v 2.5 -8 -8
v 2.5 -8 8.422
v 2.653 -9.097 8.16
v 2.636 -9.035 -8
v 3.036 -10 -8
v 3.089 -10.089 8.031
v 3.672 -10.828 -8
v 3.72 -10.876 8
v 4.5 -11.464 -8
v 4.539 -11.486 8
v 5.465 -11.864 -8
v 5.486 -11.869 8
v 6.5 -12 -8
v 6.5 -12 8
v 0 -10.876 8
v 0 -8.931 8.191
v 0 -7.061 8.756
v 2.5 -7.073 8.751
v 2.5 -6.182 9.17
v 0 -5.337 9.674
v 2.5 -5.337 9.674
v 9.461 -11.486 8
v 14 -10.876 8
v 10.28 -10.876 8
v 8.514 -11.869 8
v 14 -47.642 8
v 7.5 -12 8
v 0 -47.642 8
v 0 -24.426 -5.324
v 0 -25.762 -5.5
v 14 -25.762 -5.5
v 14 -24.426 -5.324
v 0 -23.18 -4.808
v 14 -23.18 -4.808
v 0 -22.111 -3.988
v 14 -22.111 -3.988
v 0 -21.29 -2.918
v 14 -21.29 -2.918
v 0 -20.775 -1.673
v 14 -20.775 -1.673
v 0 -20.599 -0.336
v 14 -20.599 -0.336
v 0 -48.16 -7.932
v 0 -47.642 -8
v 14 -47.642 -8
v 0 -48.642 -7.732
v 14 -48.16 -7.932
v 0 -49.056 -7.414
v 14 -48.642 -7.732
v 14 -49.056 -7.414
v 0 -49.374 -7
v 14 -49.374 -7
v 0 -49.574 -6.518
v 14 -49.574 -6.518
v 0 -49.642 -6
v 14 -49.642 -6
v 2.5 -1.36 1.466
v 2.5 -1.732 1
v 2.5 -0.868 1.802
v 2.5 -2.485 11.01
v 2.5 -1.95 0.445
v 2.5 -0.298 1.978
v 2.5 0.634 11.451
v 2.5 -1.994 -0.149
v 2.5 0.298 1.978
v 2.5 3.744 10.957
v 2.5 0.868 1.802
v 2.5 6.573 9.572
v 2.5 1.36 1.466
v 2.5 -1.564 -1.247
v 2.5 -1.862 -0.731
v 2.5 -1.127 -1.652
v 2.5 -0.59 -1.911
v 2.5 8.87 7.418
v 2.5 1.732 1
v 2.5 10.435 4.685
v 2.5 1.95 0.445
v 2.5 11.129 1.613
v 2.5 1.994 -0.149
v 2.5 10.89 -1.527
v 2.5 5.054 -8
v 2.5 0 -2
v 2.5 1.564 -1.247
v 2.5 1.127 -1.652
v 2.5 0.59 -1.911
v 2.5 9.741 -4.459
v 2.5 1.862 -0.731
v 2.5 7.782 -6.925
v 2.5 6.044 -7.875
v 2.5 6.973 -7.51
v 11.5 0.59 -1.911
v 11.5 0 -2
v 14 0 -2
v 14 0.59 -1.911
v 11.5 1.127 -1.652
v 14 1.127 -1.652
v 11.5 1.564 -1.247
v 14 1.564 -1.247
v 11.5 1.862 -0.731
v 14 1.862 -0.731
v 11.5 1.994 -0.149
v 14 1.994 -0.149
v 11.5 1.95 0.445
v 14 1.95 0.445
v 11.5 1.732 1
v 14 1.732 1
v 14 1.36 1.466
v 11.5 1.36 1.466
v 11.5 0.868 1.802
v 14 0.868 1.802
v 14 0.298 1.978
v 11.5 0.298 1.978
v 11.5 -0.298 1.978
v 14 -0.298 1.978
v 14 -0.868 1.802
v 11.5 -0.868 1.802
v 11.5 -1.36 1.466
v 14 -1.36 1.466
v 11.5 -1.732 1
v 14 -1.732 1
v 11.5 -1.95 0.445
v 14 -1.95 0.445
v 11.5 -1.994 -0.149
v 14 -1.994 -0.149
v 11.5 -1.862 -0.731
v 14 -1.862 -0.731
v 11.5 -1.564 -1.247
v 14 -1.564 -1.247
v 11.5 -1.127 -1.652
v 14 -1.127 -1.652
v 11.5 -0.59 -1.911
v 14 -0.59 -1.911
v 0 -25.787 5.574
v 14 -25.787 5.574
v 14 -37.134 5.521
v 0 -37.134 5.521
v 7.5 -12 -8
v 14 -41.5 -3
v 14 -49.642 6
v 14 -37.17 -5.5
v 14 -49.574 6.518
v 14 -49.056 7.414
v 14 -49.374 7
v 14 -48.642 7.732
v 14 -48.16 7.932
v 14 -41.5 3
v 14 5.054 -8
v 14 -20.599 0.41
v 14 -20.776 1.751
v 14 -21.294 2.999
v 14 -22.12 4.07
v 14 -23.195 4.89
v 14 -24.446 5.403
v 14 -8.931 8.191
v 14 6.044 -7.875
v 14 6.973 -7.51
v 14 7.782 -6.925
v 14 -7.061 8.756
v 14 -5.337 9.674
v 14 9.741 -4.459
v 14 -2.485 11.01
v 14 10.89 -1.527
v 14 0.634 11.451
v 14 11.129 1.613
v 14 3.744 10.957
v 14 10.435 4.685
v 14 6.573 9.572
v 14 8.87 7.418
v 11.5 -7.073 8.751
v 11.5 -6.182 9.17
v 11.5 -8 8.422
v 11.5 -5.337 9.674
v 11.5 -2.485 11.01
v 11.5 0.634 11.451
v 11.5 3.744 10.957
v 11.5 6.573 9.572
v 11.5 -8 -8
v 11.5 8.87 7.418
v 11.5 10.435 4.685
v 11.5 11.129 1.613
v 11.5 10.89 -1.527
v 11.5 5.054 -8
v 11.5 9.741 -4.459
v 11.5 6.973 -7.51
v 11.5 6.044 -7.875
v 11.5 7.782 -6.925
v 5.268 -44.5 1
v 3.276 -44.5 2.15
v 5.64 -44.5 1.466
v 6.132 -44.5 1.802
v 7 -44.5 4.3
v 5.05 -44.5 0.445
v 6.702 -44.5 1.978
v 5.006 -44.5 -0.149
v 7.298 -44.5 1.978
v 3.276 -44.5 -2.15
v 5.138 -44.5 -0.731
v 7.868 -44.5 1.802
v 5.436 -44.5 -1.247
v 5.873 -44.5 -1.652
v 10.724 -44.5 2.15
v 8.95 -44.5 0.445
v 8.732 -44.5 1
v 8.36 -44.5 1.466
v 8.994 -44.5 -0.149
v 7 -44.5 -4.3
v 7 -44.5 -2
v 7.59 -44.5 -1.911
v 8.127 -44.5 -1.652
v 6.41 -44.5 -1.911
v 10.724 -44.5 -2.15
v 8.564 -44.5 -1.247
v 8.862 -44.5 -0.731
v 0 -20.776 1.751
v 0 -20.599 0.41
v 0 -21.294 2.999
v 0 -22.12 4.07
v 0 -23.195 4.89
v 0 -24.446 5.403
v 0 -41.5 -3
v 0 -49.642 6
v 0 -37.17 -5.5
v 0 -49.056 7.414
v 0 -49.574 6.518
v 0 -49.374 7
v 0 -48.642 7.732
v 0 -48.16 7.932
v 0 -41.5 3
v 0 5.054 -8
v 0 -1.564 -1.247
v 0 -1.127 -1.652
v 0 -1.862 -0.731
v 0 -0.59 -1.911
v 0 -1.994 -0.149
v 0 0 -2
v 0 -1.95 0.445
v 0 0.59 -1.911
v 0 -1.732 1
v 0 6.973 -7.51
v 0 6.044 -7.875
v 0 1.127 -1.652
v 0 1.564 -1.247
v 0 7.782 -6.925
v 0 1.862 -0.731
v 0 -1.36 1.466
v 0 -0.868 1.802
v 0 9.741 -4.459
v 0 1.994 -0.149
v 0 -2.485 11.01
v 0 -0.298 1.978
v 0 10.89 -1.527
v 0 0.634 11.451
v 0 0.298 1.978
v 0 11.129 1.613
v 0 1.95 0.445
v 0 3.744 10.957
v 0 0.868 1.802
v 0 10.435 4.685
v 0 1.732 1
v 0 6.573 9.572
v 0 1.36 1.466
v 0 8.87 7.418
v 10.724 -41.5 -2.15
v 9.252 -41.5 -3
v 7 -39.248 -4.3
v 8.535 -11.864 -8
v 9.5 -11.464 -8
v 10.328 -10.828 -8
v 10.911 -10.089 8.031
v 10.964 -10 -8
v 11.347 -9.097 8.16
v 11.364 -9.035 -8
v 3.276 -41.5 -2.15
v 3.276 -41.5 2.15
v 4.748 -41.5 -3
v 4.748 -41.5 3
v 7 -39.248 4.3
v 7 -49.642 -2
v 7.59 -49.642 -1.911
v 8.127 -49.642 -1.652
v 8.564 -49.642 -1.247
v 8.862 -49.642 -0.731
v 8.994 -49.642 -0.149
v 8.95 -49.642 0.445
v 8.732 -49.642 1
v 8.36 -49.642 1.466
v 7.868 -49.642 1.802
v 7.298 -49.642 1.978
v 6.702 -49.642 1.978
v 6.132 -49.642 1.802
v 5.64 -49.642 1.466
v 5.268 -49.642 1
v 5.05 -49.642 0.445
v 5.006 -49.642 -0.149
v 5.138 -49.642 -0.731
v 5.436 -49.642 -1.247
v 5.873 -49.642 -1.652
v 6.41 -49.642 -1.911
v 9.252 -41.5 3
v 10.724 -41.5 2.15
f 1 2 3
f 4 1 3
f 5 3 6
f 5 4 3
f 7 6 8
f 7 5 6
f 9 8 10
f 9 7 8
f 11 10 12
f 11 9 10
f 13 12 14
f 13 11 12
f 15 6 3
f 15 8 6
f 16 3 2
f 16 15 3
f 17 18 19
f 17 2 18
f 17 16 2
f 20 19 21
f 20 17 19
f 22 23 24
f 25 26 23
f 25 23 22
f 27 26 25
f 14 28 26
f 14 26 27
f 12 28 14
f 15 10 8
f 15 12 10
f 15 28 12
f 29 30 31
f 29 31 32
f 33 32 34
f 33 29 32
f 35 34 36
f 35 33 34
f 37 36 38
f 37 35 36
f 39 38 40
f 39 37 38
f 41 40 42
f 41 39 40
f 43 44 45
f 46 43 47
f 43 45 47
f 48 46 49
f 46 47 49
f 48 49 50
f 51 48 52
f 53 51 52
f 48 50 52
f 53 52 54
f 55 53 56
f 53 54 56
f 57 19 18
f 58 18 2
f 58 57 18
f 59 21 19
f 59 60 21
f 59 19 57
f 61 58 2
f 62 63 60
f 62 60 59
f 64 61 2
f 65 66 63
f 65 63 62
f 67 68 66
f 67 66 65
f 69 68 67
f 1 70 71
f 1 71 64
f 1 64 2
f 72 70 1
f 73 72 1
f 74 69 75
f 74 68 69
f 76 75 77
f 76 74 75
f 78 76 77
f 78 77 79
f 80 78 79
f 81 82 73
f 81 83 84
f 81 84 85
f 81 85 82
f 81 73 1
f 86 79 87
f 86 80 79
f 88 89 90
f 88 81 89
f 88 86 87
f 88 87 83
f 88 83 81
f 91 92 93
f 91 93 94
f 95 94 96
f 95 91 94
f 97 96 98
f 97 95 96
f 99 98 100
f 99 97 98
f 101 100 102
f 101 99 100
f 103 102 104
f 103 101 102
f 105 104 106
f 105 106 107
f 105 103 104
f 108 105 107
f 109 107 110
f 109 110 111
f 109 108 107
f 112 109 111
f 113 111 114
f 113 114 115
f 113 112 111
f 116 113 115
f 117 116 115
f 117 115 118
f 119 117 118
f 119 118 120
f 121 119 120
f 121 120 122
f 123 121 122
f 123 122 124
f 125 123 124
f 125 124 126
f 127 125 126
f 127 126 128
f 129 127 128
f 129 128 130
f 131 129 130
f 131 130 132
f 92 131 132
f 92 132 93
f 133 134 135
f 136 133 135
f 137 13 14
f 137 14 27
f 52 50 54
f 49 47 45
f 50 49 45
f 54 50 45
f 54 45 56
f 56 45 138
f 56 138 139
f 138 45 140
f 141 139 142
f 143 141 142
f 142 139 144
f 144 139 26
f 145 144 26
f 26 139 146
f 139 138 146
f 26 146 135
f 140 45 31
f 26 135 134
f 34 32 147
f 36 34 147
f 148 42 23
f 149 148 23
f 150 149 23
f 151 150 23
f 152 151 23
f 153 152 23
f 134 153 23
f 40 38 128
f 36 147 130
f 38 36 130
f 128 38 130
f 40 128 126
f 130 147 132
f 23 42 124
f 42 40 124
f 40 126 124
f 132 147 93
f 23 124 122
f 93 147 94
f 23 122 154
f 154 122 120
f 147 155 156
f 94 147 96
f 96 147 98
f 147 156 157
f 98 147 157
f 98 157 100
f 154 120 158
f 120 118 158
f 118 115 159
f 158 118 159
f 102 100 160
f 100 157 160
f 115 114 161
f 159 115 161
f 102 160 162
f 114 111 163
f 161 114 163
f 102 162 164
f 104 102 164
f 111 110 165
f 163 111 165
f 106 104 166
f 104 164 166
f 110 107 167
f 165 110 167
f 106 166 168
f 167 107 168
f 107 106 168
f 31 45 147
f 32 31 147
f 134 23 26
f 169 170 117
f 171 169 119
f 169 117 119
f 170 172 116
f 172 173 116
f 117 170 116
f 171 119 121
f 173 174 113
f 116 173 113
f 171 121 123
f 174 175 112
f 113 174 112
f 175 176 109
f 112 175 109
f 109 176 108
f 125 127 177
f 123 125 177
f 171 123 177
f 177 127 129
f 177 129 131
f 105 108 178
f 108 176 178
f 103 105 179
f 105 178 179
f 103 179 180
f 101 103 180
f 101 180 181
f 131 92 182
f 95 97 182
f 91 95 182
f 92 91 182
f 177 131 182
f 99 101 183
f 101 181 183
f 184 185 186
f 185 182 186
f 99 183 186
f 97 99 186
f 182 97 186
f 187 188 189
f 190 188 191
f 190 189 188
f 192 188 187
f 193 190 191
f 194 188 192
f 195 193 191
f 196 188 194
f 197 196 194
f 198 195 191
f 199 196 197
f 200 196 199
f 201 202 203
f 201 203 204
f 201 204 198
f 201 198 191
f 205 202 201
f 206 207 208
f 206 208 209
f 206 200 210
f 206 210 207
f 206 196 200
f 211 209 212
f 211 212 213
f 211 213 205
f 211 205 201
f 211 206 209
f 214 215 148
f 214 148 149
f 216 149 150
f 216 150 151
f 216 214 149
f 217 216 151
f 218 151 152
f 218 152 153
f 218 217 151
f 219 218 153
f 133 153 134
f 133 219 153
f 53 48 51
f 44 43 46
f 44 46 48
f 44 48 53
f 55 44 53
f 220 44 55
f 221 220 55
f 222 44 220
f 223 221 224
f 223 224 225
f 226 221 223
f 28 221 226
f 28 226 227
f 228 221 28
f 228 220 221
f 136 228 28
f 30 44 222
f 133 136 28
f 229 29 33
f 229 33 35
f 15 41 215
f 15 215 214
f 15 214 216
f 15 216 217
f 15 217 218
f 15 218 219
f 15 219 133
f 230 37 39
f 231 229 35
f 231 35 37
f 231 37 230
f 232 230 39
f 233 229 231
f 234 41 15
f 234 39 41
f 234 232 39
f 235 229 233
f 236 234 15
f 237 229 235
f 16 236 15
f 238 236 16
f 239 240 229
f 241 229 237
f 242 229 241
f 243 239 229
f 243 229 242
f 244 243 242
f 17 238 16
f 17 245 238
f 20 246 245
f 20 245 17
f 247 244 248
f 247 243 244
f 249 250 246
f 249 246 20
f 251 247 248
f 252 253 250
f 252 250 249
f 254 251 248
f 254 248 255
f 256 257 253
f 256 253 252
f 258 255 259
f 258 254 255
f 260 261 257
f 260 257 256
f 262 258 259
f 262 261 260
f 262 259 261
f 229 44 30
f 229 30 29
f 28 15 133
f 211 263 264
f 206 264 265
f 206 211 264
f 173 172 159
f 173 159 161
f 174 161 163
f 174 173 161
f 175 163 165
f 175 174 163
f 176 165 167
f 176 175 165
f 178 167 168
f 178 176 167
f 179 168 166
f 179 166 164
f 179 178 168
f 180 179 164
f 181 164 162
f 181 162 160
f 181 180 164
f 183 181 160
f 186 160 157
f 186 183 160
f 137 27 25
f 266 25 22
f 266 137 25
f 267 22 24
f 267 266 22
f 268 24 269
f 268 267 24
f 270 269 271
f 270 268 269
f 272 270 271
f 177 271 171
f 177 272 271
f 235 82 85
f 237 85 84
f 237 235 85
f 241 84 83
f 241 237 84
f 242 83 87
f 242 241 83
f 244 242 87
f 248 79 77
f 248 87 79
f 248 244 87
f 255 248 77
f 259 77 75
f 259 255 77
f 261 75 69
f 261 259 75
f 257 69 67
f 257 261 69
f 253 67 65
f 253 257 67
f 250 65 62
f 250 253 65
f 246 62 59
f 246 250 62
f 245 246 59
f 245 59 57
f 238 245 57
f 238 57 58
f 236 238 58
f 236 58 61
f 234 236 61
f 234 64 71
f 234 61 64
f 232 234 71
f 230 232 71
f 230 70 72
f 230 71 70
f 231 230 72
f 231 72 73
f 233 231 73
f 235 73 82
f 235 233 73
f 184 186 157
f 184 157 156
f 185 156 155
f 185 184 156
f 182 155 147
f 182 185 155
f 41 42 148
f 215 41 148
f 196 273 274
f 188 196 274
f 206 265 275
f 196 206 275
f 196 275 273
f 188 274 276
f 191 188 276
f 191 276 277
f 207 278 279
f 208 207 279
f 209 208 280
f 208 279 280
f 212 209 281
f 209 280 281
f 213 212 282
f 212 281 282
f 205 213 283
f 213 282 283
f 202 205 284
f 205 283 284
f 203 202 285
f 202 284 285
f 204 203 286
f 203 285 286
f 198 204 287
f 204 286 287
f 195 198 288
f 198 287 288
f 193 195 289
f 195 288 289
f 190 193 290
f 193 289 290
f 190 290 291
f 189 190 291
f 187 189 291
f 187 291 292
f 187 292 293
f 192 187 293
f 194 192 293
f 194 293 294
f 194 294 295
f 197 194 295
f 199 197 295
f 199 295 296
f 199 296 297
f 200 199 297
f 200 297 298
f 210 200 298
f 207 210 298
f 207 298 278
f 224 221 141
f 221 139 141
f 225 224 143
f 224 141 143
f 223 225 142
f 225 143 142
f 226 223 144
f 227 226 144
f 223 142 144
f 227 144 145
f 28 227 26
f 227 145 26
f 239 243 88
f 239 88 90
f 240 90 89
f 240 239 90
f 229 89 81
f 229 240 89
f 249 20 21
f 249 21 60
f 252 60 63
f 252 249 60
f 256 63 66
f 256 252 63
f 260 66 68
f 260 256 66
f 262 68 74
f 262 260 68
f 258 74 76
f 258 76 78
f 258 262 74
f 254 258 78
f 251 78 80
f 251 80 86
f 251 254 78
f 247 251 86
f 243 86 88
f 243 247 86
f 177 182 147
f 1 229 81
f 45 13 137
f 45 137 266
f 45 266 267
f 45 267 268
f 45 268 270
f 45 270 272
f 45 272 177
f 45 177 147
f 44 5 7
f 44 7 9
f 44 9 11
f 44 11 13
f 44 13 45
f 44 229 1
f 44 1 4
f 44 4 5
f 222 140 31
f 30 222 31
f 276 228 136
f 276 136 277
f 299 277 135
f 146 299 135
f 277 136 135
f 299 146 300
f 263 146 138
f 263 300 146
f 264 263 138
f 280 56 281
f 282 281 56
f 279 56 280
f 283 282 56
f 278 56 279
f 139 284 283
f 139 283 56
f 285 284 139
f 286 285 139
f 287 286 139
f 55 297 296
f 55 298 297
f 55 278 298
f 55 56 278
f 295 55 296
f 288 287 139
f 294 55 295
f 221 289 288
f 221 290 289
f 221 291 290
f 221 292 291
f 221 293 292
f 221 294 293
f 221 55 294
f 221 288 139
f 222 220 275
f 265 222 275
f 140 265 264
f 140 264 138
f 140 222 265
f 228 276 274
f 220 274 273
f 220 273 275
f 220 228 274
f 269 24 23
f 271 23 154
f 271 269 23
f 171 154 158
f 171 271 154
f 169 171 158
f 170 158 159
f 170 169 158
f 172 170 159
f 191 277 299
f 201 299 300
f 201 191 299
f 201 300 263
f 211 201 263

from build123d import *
from OCP.BRepFilletAPI import BRepFilletAPI_MakeChamfer

# Parameters (mm, degrees)
SKETCH9_R           = 2
BOSS_EXTRUDE3_DEPTH = 14
SKETCH10_R          = 2
CUT_EXTRUDE7_DEPTH  = 14
SKETCH11_W          = 9
SKETCH11_H          = 26.686138344
CUT_EXTRUDE8_DEPTH  = 28
FILLET1_R           = 2
CHAMFER1_SIZE       = 2.5
CHAMFER1_SIZE2      = 4.365846821
CHAMFER1_SIZE2_2    = 4.330127019
EXTRUDE1_DEPTH      = 3
EXTRUDE1_DEPTH_BACK = 3
FILLET2_R           = 4


with BuildPart() as part:
    # Sketch9 → Boss-Extrude3 (new body)
    with BuildSketch(Plane(origin=(0, 0, 0), x_dir=(0, 0, -1), z_dir=(1, 0, 0))):
        with BuildLine():
            Line((8, 5.053889445), (8, -49.642014822))
            Line((8, -49.642014822), (-8, -49.642014822))
            Line((-8, -49.642014822), (-8, -10.875806049))
            ThreePointArc((-8, -10.875806049), (-8.427714838, -7.982476346), (-9.674271354, -5.336650652))
            ThreePointArc((-9.674271354, -5.336650652), (-7.418447874, 8.870328147), (6.925281884, 7.78202542))
            ThreePointArc((6.925281884, 7.78202542), (7.721634556, 6.519985019), (8, 5.053889445))
        make_face()
        Circle(SKETCH9_R, mode=Mode.SUBTRACT)
        with BuildLine():
            Line((5.5, -41.5), (5.5, -25.762364524))
            ThreePointArc((5.5, -25.762364524), (3.987567872, -22.111030369), (0.336233717, -20.598598241))
            Line((0.336233717, -20.598598241), (-0.410415455, -20.598598241))
            ThreePointArc((-0.410415455, -20.598598241), (-4.070351606, -22.119652678), (-5.574124284, -25.786723302))
            Line((-5.574124284, -25.786723302), (-5.5, -41.5))
            Line((-5.5, -41.5), (5.5, -41.5))
        make_face(mode=Mode.SUBTRACT)
    extrude(amount=BOSS_EXTRUDE3_DEPTH)

    # Sketch10 → Cut-Extrude7 (cut)
    with BuildSketch(Plane.XZ.offset(49.642014822)):
        with Locations(Location((7, 0, 0), (0, 0, 270))):
            Circle(SKETCH10_R)
    extrude(amount=-CUT_EXTRUDE7_DEPTH, mode=Mode.SUBTRACT)

    # Sketch11 → Cut-Extrude8 (cut)
    with BuildSketch(Plane(origin=(0, 16, 0), x_dir=(1, 0, 0), z_dir=(0, 1, 0))):
        with Locations((7, -2.737831409)):
            Rectangle(SKETCH11_W, SKETCH11_H)
    extrude(amount=-CUT_EXTRUDE8_DEPTH, mode=Mode.SUBTRACT)

    # Fillet1
    fillet1_edges = [part.edges().sort_by_distance(p)[0] for p in [
        (7, -49.642014822, 8),
        (7, -49.642014822, -8),
    ]]
    fillet(fillet1_edges, radius=FILLET1_R)

    # Chamfer1: one chamfer whose edges measure the first distance from different faces: ONE call of the kernel's chamfer builder (chamfer() names one face for all edges)
    chamfer1_edges_1 = [part.edges().sort_by_distance(p)[0] for p in [
        (7, -41.5, 5.5),
    ]]
    chamfer1_side_1 = [part.faces().sort_by_distance(p)[0] for p in [
        (7, -41.5, 5.321955062),
    ]]
    chamfer1_edges_2 = [part.edges().sort_by_distance(p)[0] for p in [
        (7, -41.5, -5.5),
    ]]
    chamfer1_side_2 = [part.faces().sort_by_distance(p)[0] for p in [
        (7, -41.5, 5.321955062),
    ]]
    chamfer1 = BRepFilletAPI_MakeChamfer(part.part.solid().wrapped)
    for e in chamfer1_edges_1:
        chamfer1.Add(CHAMFER1_SIZE, CHAMFER1_SIZE2, e.wrapped, chamfer1_side_1[0].wrapped)  # the first distance lies on this face
    for e in chamfer1_edges_2:
        chamfer1.Add(CHAMFER1_SIZE, CHAMFER1_SIZE2_2, e.wrapped, chamfer1_side_2[0].wrapped)  # the first distance lies on this face
    add(Compound.cast(chamfer1.Shape()), mode=Mode.REPLACE)

    # Sketch12 → Extrude1 (cut, two sides)
    with BuildSketch(Plane(origin=(0, -41.5, 0), x_dir=(1, 0, 0), z_dir=(0, 1, 0))) as extrude1_sk:
        Polygon((7, 4.3), (3.276090764, 2.15), (3.276090764, -2.15), (7, -4.3), (10.723909236, -2.15), (10.723909236, 2.15), align=None)
    extrude(amount=EXTRUDE1_DEPTH, mode=Mode.SUBTRACT)
    extrude(extrude1_sk.sketch, amount=-EXTRUDE1_DEPTH_BACK, mode=Mode.SUBTRACT)

    # Fillet2
    fillet2_edges = [part.edges().sort_by_distance(p)[0] for p in [
        (2.5, -12, 0),
        (11.5, -12, 0),
    ]]
    fillet(fillet2_edges, radius=FILLET2_R)


solid = part.part
